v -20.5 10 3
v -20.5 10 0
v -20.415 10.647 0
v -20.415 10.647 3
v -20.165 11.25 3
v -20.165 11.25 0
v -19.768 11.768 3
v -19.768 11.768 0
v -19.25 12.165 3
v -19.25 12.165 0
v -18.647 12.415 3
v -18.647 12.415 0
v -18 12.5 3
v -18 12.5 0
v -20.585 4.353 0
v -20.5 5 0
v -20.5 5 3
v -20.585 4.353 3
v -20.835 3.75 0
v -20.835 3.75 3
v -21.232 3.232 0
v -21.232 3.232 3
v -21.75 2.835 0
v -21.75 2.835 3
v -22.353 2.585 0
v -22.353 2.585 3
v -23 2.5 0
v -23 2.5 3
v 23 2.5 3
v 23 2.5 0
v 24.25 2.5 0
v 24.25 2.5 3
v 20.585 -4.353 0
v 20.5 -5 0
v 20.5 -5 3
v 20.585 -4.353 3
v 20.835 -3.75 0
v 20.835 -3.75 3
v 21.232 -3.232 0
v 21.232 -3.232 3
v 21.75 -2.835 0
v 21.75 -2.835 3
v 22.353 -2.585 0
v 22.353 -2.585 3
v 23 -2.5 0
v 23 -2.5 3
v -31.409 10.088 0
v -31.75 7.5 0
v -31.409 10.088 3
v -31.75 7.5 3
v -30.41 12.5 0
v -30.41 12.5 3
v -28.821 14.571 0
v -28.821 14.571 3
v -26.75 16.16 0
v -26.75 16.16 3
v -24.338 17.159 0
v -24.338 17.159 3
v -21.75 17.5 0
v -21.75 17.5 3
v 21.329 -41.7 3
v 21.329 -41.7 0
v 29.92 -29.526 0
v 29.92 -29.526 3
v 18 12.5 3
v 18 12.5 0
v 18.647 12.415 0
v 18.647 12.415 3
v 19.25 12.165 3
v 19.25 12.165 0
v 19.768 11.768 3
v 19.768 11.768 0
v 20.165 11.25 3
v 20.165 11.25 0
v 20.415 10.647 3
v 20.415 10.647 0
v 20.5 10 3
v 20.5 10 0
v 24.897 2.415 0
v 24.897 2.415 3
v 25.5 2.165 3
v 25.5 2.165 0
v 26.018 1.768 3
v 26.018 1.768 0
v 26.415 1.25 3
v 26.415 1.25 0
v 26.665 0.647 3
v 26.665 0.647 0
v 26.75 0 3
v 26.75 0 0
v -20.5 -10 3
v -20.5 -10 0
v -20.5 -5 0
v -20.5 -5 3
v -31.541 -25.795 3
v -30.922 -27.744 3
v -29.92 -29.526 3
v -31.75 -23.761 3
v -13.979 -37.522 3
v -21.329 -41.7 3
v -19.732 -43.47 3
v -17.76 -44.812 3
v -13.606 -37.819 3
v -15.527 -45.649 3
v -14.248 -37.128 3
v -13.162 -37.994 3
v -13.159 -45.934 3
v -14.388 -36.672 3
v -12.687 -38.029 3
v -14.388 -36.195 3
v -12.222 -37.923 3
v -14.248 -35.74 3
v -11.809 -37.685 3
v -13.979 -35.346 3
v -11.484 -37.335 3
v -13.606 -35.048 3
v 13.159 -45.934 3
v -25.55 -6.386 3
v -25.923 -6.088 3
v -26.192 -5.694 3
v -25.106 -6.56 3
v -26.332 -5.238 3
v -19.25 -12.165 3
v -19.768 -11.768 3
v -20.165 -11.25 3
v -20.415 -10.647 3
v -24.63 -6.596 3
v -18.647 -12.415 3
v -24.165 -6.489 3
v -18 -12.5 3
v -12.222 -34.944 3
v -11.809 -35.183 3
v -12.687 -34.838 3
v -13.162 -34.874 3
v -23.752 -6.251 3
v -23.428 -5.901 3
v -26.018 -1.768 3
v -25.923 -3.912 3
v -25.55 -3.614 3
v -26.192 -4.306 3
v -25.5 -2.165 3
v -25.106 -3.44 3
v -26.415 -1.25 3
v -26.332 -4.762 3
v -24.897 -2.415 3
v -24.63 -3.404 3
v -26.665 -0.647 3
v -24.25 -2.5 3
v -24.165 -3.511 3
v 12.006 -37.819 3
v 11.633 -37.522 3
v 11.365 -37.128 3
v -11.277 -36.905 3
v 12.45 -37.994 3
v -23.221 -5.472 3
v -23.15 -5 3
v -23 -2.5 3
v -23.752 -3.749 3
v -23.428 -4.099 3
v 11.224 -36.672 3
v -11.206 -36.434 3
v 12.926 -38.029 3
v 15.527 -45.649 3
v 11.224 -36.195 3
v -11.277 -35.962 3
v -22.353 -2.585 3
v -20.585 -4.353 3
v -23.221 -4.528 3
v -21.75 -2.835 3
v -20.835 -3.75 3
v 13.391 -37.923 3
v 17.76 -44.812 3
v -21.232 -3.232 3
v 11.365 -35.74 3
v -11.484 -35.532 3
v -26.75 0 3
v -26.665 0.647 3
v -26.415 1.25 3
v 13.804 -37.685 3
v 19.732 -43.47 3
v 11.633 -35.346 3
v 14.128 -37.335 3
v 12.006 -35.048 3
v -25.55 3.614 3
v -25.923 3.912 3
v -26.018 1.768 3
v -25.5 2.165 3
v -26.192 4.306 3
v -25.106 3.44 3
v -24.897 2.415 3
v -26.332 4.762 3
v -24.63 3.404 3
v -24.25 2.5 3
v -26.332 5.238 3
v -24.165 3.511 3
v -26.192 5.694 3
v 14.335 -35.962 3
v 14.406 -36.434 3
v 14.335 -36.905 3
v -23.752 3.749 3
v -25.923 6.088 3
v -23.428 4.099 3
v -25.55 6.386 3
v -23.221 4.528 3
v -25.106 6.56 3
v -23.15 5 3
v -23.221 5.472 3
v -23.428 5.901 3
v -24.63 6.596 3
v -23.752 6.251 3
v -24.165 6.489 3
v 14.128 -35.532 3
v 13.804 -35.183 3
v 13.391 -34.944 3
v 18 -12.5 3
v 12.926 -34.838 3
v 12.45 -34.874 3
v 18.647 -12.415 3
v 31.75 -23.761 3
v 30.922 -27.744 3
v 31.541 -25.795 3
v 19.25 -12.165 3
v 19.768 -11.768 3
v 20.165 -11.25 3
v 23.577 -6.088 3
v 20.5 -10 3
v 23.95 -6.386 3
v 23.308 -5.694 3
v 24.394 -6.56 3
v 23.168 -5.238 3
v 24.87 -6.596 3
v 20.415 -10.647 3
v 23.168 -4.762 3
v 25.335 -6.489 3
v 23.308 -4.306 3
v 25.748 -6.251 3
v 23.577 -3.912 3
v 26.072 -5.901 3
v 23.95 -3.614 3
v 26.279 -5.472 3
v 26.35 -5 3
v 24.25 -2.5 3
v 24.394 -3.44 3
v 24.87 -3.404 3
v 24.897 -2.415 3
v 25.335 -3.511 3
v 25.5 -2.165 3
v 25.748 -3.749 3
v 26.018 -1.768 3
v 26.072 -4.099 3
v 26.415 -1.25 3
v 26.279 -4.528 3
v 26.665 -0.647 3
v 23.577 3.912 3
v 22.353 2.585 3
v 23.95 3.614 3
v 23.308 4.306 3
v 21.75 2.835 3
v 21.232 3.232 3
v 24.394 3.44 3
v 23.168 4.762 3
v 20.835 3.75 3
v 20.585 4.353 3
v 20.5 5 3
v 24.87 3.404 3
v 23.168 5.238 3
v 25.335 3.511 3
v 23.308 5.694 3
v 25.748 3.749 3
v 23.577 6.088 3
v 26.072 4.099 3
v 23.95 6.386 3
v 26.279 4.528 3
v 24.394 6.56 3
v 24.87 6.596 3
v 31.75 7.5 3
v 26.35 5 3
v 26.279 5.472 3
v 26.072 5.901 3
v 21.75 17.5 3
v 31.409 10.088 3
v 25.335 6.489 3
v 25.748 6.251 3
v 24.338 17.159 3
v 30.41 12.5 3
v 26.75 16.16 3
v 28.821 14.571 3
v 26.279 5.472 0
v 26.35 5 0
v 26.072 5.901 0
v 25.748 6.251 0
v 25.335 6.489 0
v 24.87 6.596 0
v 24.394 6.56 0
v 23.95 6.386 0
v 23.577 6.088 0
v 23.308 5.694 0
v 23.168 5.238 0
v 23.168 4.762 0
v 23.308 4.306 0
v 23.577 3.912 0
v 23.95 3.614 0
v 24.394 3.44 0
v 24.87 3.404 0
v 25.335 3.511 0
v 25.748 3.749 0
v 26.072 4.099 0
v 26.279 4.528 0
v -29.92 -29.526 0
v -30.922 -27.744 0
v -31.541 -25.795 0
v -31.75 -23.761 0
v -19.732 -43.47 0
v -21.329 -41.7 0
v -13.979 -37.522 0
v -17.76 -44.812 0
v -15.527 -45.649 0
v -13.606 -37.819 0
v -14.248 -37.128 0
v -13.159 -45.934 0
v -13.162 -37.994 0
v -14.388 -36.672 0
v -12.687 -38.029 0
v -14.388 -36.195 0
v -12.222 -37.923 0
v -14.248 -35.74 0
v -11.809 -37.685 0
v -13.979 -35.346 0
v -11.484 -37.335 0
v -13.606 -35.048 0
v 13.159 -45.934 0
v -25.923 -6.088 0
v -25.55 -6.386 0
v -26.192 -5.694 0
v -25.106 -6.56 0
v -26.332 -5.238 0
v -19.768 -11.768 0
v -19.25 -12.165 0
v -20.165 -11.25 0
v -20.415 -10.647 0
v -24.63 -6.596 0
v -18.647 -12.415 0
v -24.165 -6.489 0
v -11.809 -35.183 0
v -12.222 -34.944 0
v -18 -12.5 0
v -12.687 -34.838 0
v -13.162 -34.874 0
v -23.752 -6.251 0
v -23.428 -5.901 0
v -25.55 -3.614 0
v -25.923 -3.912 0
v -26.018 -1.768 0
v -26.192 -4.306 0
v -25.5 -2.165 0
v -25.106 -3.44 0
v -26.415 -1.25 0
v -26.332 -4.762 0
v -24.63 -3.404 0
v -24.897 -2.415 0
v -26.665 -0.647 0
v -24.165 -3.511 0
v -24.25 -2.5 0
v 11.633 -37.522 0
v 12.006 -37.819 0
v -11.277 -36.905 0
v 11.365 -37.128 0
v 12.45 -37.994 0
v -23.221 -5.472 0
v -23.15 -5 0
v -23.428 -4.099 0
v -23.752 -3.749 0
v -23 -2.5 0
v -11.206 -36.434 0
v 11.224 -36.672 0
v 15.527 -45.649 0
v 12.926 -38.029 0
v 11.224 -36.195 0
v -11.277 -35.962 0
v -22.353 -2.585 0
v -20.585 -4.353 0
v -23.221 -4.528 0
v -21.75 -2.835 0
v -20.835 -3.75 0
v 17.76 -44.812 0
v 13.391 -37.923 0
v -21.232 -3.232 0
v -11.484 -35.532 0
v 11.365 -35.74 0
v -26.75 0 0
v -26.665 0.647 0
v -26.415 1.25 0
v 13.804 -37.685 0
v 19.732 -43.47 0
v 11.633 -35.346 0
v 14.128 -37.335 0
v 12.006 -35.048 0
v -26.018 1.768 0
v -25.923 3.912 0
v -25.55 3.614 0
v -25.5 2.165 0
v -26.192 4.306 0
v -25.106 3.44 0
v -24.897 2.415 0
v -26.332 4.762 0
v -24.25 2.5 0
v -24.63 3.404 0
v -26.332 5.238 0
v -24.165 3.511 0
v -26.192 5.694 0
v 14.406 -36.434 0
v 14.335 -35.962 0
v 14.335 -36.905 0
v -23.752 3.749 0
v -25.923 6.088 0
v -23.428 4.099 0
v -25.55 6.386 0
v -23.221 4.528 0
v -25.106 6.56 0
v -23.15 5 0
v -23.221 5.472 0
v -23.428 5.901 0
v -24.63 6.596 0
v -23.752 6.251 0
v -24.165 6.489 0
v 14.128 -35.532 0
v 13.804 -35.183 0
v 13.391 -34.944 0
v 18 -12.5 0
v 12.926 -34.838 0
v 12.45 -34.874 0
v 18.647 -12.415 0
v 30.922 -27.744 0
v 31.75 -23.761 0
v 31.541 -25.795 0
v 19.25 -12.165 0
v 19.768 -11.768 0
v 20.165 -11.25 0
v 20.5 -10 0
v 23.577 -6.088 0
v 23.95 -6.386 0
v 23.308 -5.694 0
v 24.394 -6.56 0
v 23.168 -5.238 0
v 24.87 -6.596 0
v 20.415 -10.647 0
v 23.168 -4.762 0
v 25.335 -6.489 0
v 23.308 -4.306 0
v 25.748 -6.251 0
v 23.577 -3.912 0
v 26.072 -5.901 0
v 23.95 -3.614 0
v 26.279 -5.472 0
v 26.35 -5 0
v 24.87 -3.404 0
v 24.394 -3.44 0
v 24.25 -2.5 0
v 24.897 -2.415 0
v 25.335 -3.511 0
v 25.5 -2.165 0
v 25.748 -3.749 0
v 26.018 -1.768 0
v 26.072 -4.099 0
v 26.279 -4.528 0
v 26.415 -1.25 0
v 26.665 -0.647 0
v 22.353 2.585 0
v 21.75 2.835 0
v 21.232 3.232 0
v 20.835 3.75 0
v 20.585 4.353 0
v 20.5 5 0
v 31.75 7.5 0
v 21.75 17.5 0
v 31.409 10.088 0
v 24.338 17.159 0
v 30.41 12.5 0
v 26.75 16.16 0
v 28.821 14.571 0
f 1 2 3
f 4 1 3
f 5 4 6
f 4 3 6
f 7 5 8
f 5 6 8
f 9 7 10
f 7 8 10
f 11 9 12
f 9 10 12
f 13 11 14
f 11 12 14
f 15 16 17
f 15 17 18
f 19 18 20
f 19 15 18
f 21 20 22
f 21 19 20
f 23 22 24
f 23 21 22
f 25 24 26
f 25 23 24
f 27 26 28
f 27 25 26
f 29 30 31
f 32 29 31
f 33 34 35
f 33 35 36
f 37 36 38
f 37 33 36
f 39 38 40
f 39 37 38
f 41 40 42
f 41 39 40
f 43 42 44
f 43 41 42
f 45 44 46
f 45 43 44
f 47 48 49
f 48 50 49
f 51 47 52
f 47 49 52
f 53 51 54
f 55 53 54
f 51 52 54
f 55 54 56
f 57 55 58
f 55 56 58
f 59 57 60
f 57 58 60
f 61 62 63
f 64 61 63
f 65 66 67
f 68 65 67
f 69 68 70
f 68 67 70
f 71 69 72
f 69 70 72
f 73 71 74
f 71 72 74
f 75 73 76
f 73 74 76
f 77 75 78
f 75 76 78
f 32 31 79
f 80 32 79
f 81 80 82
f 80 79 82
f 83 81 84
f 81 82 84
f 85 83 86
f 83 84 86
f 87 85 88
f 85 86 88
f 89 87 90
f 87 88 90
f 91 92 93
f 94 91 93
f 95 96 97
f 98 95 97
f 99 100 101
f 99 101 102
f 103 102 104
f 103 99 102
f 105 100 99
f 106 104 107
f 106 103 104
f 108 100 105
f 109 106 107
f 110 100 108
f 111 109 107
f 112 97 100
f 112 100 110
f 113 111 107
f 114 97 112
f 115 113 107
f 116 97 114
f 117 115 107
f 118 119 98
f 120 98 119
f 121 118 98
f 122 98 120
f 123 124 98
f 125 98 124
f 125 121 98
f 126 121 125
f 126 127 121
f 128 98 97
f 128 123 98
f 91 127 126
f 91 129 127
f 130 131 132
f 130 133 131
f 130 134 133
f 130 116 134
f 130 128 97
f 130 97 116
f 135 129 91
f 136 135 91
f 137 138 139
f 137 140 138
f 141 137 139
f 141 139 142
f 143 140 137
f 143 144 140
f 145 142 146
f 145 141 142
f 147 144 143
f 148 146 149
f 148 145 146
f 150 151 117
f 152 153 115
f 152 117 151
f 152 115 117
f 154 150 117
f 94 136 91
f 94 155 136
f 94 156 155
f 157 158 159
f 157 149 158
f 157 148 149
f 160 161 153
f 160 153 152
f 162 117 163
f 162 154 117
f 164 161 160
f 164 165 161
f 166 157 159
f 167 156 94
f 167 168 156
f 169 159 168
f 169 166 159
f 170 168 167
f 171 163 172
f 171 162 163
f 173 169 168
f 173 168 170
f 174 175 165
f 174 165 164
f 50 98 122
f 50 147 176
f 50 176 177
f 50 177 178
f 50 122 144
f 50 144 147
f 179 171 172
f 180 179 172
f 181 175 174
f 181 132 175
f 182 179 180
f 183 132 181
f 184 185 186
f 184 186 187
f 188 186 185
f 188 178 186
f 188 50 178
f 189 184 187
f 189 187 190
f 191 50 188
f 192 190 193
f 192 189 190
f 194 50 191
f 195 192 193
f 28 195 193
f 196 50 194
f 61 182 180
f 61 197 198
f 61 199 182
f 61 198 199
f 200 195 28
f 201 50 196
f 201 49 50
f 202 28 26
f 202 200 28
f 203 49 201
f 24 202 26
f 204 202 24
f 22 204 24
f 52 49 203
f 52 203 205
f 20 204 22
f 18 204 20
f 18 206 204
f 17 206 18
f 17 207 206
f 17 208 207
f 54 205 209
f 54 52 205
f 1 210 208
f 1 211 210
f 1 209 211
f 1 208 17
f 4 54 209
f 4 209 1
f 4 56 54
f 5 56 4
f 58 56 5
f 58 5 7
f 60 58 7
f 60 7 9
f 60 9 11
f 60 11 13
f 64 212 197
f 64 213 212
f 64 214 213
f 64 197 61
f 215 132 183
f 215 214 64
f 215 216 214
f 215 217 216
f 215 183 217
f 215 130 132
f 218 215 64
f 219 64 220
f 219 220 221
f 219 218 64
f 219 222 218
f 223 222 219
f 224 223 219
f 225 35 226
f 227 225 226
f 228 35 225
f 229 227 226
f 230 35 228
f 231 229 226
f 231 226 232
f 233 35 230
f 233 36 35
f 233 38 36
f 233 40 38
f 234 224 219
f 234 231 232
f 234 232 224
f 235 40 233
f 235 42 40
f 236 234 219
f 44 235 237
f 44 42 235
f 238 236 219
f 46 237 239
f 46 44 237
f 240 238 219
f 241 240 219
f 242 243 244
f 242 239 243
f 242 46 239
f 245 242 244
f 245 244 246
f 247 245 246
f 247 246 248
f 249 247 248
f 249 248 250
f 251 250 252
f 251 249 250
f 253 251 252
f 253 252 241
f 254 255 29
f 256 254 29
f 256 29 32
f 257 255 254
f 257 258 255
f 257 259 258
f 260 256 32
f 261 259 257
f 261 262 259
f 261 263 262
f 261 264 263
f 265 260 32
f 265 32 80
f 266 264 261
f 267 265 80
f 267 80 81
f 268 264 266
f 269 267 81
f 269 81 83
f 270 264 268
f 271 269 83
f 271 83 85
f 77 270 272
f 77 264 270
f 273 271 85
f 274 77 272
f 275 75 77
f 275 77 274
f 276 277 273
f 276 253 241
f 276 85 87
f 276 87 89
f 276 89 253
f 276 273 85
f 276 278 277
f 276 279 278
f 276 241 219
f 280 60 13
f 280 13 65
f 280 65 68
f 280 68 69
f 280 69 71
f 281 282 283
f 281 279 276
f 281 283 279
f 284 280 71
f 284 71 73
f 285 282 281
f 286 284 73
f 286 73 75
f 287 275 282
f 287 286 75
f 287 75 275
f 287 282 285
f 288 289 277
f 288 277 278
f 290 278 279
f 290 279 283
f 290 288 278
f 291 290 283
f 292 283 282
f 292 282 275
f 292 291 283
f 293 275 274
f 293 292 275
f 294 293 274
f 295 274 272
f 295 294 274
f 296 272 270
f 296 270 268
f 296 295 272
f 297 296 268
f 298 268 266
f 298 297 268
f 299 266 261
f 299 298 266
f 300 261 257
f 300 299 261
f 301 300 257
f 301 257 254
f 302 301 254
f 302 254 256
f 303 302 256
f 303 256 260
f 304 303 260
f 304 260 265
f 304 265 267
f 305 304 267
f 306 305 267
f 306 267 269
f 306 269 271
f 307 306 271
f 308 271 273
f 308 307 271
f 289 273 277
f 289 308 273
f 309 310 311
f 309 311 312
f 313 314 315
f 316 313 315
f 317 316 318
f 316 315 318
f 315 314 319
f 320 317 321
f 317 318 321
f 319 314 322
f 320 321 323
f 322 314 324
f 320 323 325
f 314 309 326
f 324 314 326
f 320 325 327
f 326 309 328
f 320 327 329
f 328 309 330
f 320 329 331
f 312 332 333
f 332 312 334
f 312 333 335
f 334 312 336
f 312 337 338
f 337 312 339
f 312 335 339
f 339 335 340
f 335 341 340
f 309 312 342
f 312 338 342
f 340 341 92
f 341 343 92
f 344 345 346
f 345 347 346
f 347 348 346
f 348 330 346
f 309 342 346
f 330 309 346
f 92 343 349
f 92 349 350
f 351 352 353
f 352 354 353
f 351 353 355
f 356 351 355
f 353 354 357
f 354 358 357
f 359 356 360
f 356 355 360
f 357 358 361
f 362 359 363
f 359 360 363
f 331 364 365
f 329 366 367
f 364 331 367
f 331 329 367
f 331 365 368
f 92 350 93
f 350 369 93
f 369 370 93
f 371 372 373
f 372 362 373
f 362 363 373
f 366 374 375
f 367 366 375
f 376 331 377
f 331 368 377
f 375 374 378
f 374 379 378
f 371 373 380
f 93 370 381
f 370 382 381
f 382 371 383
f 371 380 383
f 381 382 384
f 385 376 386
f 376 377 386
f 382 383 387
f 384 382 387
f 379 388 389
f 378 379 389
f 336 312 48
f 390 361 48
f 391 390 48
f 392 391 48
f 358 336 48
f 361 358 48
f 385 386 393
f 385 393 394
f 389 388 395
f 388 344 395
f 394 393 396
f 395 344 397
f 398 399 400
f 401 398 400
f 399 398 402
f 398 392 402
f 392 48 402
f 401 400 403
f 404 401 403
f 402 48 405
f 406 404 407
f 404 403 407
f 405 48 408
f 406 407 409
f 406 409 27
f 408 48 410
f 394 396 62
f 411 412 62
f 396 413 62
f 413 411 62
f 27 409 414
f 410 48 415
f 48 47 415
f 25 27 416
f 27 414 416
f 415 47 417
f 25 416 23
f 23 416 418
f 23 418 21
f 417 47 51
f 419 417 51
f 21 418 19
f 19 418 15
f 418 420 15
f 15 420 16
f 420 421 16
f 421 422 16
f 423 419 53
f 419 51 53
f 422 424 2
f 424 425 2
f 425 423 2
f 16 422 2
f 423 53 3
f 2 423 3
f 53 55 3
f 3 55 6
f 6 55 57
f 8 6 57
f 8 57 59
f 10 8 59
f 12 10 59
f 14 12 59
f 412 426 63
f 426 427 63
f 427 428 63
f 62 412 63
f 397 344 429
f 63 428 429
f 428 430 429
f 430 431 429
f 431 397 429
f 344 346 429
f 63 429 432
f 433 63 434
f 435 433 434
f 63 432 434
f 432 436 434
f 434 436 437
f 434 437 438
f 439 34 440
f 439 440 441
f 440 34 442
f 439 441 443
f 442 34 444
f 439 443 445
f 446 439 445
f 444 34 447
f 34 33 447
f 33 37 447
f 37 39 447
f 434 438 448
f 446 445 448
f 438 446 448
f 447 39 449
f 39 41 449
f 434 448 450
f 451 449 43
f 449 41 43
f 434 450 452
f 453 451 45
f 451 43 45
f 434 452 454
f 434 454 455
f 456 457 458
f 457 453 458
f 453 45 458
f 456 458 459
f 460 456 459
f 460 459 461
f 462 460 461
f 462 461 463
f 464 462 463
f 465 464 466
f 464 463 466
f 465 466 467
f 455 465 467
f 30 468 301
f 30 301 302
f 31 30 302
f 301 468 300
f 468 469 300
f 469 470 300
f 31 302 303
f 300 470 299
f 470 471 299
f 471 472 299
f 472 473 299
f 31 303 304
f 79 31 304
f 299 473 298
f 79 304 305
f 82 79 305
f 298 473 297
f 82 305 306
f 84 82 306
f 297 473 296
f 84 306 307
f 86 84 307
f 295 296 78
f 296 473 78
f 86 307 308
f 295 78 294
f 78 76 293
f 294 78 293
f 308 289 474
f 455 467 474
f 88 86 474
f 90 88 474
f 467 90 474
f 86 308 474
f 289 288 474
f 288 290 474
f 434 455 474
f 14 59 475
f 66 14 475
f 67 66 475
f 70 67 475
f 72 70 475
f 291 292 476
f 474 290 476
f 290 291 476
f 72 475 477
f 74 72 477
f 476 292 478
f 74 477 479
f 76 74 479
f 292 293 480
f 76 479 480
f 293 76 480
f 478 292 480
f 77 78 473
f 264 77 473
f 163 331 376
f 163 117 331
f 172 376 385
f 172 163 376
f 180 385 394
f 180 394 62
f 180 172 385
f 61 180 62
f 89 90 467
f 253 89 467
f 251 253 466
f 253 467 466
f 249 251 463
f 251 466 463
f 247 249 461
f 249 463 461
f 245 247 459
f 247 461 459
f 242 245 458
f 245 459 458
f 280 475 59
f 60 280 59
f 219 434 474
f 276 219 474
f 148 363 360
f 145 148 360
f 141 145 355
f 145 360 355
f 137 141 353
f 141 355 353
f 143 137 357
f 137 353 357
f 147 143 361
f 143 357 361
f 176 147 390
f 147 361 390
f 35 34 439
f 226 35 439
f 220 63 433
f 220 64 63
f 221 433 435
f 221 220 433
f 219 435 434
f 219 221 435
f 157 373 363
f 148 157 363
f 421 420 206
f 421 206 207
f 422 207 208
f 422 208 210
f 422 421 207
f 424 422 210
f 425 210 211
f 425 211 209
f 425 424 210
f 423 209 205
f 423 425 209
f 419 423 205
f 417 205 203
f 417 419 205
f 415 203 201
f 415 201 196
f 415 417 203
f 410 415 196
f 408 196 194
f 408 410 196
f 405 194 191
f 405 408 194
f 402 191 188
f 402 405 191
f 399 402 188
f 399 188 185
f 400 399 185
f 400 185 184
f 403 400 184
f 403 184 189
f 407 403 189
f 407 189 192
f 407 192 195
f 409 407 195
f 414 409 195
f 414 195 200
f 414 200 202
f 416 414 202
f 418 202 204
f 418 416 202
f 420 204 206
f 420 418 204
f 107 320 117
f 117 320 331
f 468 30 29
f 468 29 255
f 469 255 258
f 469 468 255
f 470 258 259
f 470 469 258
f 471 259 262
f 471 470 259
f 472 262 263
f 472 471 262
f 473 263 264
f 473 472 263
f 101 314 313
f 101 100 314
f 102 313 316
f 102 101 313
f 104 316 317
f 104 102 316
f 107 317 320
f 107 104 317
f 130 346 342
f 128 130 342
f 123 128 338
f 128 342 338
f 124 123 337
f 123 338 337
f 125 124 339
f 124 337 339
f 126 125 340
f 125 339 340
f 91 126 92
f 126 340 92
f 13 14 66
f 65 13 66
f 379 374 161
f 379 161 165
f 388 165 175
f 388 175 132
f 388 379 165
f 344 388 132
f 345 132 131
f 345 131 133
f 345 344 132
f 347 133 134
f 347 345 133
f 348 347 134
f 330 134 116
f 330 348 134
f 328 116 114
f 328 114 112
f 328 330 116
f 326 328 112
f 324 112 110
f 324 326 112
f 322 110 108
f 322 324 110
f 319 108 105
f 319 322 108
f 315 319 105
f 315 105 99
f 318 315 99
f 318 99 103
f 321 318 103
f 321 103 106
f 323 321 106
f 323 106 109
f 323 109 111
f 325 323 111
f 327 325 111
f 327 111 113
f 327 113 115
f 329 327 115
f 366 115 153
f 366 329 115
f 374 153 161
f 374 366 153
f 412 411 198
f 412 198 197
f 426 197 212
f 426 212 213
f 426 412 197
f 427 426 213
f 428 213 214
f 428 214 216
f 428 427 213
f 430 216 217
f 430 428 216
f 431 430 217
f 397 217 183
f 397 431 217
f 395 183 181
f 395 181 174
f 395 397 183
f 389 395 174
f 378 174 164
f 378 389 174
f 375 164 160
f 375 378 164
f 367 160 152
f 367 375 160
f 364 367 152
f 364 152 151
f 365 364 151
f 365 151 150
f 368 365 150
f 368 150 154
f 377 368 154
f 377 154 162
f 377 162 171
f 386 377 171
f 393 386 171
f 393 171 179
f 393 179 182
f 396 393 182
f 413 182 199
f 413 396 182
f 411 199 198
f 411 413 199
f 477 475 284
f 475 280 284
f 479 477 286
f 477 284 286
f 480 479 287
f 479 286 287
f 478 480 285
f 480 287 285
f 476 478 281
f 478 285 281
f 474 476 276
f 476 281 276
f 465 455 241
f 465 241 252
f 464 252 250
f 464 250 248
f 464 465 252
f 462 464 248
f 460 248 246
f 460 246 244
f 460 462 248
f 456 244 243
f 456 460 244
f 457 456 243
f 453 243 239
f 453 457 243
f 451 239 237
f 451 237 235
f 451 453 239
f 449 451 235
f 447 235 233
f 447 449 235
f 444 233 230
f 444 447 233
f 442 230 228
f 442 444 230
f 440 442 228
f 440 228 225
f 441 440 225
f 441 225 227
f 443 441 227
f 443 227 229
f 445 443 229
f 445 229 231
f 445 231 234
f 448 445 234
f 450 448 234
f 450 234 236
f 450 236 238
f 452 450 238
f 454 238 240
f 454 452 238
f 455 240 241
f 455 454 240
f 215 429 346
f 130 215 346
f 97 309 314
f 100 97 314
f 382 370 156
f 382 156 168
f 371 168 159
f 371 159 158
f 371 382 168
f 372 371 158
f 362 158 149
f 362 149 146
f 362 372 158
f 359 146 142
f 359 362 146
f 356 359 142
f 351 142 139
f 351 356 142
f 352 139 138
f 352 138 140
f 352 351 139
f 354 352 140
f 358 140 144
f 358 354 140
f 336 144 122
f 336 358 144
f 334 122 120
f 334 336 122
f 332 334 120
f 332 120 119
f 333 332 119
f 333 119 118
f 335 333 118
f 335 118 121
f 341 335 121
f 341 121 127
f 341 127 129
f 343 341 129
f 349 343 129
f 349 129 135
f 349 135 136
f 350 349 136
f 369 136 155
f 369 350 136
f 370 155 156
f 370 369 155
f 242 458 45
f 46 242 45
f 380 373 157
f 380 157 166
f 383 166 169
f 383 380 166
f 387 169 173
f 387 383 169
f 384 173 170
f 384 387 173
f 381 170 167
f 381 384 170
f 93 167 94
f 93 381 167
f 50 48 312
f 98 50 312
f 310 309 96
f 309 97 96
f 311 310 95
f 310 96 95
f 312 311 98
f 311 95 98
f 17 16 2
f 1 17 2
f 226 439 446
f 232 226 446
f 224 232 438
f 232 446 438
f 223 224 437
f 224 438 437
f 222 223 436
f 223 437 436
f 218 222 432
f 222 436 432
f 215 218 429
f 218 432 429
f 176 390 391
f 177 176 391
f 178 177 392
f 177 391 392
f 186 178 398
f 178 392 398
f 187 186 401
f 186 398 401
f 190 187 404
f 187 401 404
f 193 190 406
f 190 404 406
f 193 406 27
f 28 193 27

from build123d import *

# Parameters (mm, degrees)
ESBO_O1_R                = 1.6
RESSALTO_EXTRUS_O1_DEPTH = 3
FILETE1_R                = 10
FILETE2_START            = -1
FILETE2_DEPTH            = 5
FILETE2_2_DEPTH          = 3


with BuildPart() as part:
    # Esboço1 → Ressalto-extrusão1 (new body)
    with BuildSketch(Plane.XY):
        Polygon((-31.75, -26.93380815), (-18.341364608, -45.93380815), (18.341364608, -45.93380815), (31.75, -26.93380815), (31.75, 17.5), (-31.75, 17.5), align=None)
        with Locations((-12.806248475, -36.43380815)):
            Circle(ESBO_O1_R, mode=Mode.SUBTRACT)
        with Locations((12.806248475, -36.43380815)):
            Circle(ESBO_O1_R, mode=Mode.SUBTRACT)
        with Locations((-24.75, -5)):
            Circle(ESBO_O1_R, mode=Mode.SUBTRACT)
        with Locations((-24.75, 5)):
            Circle(ESBO_O1_R, mode=Mode.SUBTRACT)
        with BuildLine():
            Line((-18, 12.5), (18, 12.5))
            ThreePointArc((18, 12.5), (19.767766953, 11.767766953), (20.5, 10))
            Line((20.5, 10), (20.5, 2.5))
            Line((20.5, 2.5), (26.75, 2.5))
            Line((26.75, 2.5), (26.75, -2.5))
            Line((26.75, -2.5), (20.5, -2.5))
            Line((20.5, -2.5), (20.5, -10))
            ThreePointArc((20.5, -10), (19.767766953, -11.767766953), (18, -12.5))
            Line((18, -12.5), (-18, -12.5))
            ThreePointArc((-18, -12.5), (-19.767766953, -11.767766953), (-20.5, -10))
            Line((-20.5, -10), (-20.5, -2.5))
            Line((-20.5, -2.5), (-26.75, -2.5))
            Line((-26.75, -2.5), (-26.75, 2.5))
            Line((-26.75, 2.5), (-20.5, 2.5))
            Line((-20.5, 2.5), (-20.5, 10))
            ThreePointArc((-20.5, 10), (-19.767766953, 11.767766953), (-18, 12.5))
        make_face(mode=Mode.SUBTRACT)
        with Locations((24.75, -5)):
            Circle(ESBO_O1_R, mode=Mode.SUBTRACT)
        with Locations((24.75, 5)):
            Circle(ESBO_O1_R, mode=Mode.SUBTRACT)
    extrude(amount=RESSALTO_EXTRUS_O1_DEPTH)

    # Filete1
    filete1_edges = [part.edges().sort_by_distance(p)[0] for p in [
        (-31.75, 17.5, 1.5),
        (31.75, 17.5, 1.5),
        (31.75, -26.93380815, 1.5),
        (18.341364608, -45.93380815, 1.5),
        (-18.341364608, -45.93380815, 1.5),
        (-31.75, -26.93380815, 1.5),
    ]]
    fillet(filete1_edges, radius=FILETE1_R)

    # Filete2: read off the stored shape, not the designer's step
    # Filete2 outline → Filete2 (cut)
    with BuildSketch(Plane.XY.offset(FILETE2_START)):
        with BuildLine():
            Line((-20.5, -2.5), (-23, -2.5))
            ThreePointArc((-23, -2.5), (-21.232233047, -3.232233047), (-20.5, -5))
            Line((-20.5, -5), (-20.5, -2.5))
        make_face()
        with BuildLine():
            ThreePointArc((-20.5, 5), (-21.232233047, 3.232233047), (-23, 2.5))
            Line((-23, 2.5), (-20.5, 2.5))
            Line((-20.5, 2.5), (-20.5, 5))
        make_face()
        with BuildLine():
            Line((20.5, -2.5), (20.5, -5))
            ThreePointArc((20.5, -5), (21.232233047, -3.232233047), (23, -2.5))
            Line((23, -2.5), (20.5, -2.5))
        make_face()
        with BuildLine():
            Line((20.5, 2.5), (23, 2.5))
            ThreePointArc((23, 2.5), (21.232233047, 3.232233047), (20.5, 5))
            Line((20.5, 5), (20.5, 2.5))
        make_face()
    extrude(amount=FILETE2_DEPTH, mode=Mode.SUBTRACT)

    # Filete2 2 outline → Filete2 2 (add)
    with BuildSketch(Plane.XY):
        with BuildLine():
            ThreePointArc((-24.25, -2.5), (-26.017766953, -1.767766953), (-26.75, 0))
            Line((-26.75, 0), (-26.75, -2.5))
            Line((-26.75, -2.5), (-24.25, -2.5))
        make_face()
        with BuildLine():
            ThreePointArc((-26.75, 0), (-26.017766953, 1.767766953), (-24.25, 2.5))
            Line((-24.25, 2.5), (-26.75, 2.5))
            Line((-26.75, 2.5), (-26.75, 0))
        make_face()
        with BuildLine():
            ThreePointArc((24.25, 2.5), (26.017766953, 1.767766953), (26.75, 0))
            Line((26.75, 0), (26.75, 2.5))
            Line((26.75, 2.5), (24.25, 2.5))
        make_face()
        with BuildLine():
            ThreePointArc((26.75, 0), (26.017766953, -1.767766953), (24.25, -2.5))
            Line((24.25, -2.5), (26.75, -2.5))
            Line((26.75, -2.5), (26.75, 0))
        make_face()
    extrude(amount=FILETE2_2_DEPTH)


solid = part.part
